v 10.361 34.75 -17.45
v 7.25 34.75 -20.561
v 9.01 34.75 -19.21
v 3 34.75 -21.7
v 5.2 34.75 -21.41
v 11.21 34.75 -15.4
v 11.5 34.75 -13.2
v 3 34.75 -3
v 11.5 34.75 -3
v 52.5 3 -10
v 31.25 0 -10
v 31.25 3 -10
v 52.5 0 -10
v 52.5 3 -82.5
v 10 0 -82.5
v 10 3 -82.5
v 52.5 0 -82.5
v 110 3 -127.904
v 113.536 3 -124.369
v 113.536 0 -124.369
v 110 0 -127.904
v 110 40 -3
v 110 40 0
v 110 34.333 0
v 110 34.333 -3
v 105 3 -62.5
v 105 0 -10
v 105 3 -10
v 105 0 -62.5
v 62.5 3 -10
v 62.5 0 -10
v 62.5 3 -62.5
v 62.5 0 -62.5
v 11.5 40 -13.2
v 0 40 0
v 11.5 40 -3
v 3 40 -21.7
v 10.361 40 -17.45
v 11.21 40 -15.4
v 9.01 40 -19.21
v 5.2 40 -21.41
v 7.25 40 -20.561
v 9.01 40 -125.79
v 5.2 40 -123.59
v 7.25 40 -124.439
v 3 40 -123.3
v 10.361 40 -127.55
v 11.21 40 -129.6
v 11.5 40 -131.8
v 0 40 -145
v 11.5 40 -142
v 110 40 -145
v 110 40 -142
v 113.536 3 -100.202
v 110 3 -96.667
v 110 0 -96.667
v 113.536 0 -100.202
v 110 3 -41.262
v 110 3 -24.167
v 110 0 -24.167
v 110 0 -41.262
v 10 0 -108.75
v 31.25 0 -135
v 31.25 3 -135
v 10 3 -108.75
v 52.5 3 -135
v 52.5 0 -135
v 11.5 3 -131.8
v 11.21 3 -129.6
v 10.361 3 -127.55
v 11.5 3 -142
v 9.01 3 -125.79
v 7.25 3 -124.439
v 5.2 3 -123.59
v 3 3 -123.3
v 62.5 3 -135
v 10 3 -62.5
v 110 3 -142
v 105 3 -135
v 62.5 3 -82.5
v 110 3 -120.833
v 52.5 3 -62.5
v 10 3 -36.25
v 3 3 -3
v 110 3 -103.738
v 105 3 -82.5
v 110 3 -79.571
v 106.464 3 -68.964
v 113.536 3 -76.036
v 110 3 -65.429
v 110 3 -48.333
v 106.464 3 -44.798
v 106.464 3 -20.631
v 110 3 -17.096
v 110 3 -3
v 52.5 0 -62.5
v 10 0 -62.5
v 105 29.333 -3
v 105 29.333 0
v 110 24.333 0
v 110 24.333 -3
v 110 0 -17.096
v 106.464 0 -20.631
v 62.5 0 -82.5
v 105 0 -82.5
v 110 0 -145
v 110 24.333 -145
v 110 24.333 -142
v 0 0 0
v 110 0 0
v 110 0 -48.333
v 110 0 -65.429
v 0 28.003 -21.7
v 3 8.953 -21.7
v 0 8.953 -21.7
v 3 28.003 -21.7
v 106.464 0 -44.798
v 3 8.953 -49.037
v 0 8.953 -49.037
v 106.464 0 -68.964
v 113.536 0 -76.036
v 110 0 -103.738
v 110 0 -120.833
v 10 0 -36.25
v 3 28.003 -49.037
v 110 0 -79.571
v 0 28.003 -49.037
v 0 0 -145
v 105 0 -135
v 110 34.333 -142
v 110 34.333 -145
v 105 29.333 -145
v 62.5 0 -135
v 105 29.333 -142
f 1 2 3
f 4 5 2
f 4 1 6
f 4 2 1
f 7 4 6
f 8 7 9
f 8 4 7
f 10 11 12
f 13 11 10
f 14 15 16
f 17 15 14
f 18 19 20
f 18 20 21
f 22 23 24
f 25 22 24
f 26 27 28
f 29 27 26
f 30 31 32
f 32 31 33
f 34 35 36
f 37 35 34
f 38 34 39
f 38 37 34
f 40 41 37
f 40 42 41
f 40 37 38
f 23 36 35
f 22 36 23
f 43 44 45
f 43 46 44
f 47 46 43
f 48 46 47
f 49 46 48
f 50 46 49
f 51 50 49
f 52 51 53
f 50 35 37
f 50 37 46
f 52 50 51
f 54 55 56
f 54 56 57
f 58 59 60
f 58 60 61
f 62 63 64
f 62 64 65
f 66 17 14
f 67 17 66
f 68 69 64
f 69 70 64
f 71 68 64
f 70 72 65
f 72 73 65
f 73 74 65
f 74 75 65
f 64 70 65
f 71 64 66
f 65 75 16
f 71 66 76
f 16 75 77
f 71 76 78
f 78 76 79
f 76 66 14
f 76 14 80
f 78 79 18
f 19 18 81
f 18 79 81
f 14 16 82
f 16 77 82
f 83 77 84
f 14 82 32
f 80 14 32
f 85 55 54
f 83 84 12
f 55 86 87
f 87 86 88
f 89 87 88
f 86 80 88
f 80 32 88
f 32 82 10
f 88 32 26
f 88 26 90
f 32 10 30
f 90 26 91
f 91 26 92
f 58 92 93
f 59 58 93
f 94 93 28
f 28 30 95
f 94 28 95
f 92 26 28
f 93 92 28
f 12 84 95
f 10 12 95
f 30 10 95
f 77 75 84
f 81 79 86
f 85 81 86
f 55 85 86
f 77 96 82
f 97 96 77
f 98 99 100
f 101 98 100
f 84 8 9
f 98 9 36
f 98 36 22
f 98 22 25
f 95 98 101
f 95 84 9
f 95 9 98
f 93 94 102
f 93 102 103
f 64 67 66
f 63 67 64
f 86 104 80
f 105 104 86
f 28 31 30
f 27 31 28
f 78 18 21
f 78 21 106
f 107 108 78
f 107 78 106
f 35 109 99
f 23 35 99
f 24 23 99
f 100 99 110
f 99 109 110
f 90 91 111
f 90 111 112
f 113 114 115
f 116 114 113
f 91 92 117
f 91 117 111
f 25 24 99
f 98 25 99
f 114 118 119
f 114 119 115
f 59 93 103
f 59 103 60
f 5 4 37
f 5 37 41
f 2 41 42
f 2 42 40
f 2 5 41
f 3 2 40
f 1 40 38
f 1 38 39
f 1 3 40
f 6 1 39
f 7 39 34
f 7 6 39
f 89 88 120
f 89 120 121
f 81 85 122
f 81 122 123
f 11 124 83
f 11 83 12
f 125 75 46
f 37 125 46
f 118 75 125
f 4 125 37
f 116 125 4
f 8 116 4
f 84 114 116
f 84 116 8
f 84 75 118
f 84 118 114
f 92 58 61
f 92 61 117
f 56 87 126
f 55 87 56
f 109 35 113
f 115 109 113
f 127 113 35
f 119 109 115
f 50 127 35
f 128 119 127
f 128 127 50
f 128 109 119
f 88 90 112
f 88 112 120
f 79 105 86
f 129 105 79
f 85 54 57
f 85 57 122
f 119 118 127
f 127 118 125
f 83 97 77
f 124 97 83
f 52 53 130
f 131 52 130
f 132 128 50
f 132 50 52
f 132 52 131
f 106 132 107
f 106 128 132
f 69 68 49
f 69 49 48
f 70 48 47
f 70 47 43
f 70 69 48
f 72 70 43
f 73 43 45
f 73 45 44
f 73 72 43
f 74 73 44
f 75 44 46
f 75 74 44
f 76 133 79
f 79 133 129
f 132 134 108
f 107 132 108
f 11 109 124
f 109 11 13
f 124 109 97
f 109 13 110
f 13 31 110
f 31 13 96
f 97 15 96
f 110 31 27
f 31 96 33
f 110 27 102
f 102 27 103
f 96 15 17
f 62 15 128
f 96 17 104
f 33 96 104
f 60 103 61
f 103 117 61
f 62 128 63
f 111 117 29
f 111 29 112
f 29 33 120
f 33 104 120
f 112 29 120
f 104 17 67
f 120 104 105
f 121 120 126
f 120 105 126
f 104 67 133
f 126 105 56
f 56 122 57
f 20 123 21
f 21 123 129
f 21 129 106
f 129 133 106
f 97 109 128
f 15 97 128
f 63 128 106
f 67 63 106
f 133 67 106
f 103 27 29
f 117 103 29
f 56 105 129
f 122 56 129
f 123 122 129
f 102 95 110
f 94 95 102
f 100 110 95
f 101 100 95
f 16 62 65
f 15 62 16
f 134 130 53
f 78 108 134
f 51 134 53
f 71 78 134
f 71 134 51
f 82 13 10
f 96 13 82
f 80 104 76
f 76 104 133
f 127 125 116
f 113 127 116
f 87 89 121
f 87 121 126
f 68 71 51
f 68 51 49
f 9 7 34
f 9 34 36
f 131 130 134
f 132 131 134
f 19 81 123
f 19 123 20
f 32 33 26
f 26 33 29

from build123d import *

# Parameters (mm, degrees)
SKETCH1_W               = 220
SKETCH1_H               = 145
SKETCH1_W_2             = 42.5
SKETCH1_H_2             = 52.5
BOSS_EXTRUDE1_DEPTH     = 3
SKETCH2_W               = 220
SKETCH2_H               = 145
BOSS_EXTRUDE2_DEPTH     = 37
SKETCH3_W               = 27.3375
SKETCH3_H               = 19.05
CUT_EXTRUDE1_DEPTH      = 3
SKETCH3_6_W             = 53.975
SKETCH3_6_H             = 31.75
CUT_EXTRUDE2_DEPTH      = 8.5
CUT_EXTRUDE3_DEPTH      = 267.505159425
CUT_EXTRUDE3_DEPTH_BACK = 267.505159425
CUT_EXTRUDE4_DEPTH      = 267.071418984
CUT_EXTRUDE4_DEPTH_BACK = 267.071418984


with BuildPart() as part:
    # Sketch1 → Boss-Extrude1 (new body)
    with BuildSketch(Plane(origin=(0, 0, 0), x_dir=(1, 0, 0), z_dir=(0, 1, 0))):
        with Locations((110, 72.5)):
            Rectangle(SKETCH1_W, SKETCH1_H)
        Polygon((10, 82.5), (52.5, 82.5), (52.5, 135), (31.25, 135), (10, 108.75), align=None, mode=Mode.SUBTRACT)
        with Locations((83.75, 108.75)):
            Rectangle(SKETCH1_W_2, SKETCH1_H_2, mode=Mode.SUBTRACT)
        with Locations((83.75, 36.25)):
            Rectangle(SKETCH1_W_2, SKETCH1_H_2, mode=Mode.SUBTRACT)
        Polygon((10, 36.25), (31.25, 10), (52.5, 10), (52.5, 62.5), (10, 62.5), align=None, mode=Mode.SUBTRACT)
        Polygon((210, 62.5), (210, 36.25), (188.75, 10), (167.5, 10), (167.5, 62.5), align=None, mode=Mode.SUBTRACT)
        with Locations((136.25, 36.25)):
            Rectangle(SKETCH1_W_2, SKETCH1_H_2, mode=Mode.SUBTRACT)
        with Locations((136.25, 108.75)):
            Rectangle(SKETCH1_W_2, SKETCH1_H_2, mode=Mode.SUBTRACT)
        Polygon((210, 108.75), (188.75, 135), (167.5, 135), (167.5, 82.5), (210, 82.5), align=None, mode=Mode.SUBTRACT)
    extrude(amount=BOSS_EXTRUDE1_DEPTH)

    # Sketch2 → Boss-Extrude2 (add)
    with BuildSketch(Plane(origin=(0, 3, 0), x_dir=(1, 0, 0), z_dir=(0, 1, 0))):
        with Locations((110, 72.5)):
            Rectangle(SKETCH2_W, SKETCH2_H)
        with BuildLine():
            Line((3, 123.3), (3, 21.7))
            ThreePointArc((3, 21.7), (9.01040764, 19.21040764), (11.5, 13.2))
            Line((11.5, 13.2), (11.5, 3))
            Line((11.5, 3), (208.5, 3))
            Line((208.5, 3), (208.5, 13.2))
            ThreePointArc((208.5, 13.2), (210.98959236, 19.21040764), (217, 21.7))
            Line((217, 21.7), (217, 123.3))
            ThreePointArc((217, 123.3), (210.98959236, 125.78959236), (208.5, 131.8))
            Line((208.5, 131.8), (208.5, 142))
            Line((208.5, 142), (11.5, 142))
            Line((11.5, 142), (11.5, 131.8))
            ThreePointArc((11.5, 131.8), (9.01040764, 125.78959236), (3, 123.3))
        make_face(mode=Mode.SUBTRACT)
    extrude(amount=BOSS_EXTRUDE2_DEPTH)

    # Sketch3 → Cut-Extrude1 (cut)
    with BuildSketch(Plane.ZY.offset(-3)):
        with Locations((-35.36875, 18.478125)):
            Rectangle(SKETCH3_W, SKETCH3_H)
    extrude(amount=CUT_EXTRUDE1_DEPTH, mode=Mode.SUBTRACT)

    # Sketch3<6> → Cut-Extrude2 (cut)
    with BuildSketch(Plane.ZY.offset(-3)):
        with Locations((-29.9875, 18.875)):
            Rectangle(SKETCH3_6_W, SKETCH3_6_H)
    extrude(amount=-CUT_EXTRUDE2_DEPTH, mode=Mode.SUBTRACT)

    # Sketch7 → Cut-Extrude3 (cut, two sides)
    with BuildSketch(Plane.XY) as cut_extrude3_sk:
        Polygon((110, 40), (110, 34.333333333), (105, 29.333333333), (110, 24.333333333), (110, 18.666666667), (115, 13.666666667), (110, 8.666666667), (110, 3), (220, 3), (220, 40), align=None)
    extrude(amount=CUT_EXTRUDE3_DEPTH, mode=Mode.SUBTRACT)
    extrude(cut_extrude3_sk.sketch, amount=-CUT_EXTRUDE3_DEPTH_BACK, mode=Mode.SUBTRACT)

    # Sketch8 → Cut-Extrude4 (cut, two sides)
    with BuildSketch(Plane(origin=(0, 3, 0), x_dir=(1, 0, 0), z_dir=(0, 1, 0))) as cut_extrude4_sk:
        Polygon((110, 145), (220, 145), (220, 0), (110, 0), (110, 17.095598855), (106.464466094, 20.631132761), (110, 24.166666667), (110, 41.262265521), (106.464466094, 44.797799427), (110, 48.333333333), (110, 65.428932188), (106.464466094, 68.964466094), (113.535533906, 76.035533906), (110, 79.571067812), (110, 96.666666667), (113.535533906, 100.202200573), (110, 103.737734479), (110, 120.833333333), (113.535533906, 124.368867239), (110, 127.904401145), align=None)
    extrude(amount=CUT_EXTRUDE4_DEPTH, mode=Mode.SUBTRACT)
    extrude(cut_extrude4_sk.sketch, amount=-CUT_EXTRUDE4_DEPTH_BACK, mode=Mode.SUBTRACT)


solid = part.part
